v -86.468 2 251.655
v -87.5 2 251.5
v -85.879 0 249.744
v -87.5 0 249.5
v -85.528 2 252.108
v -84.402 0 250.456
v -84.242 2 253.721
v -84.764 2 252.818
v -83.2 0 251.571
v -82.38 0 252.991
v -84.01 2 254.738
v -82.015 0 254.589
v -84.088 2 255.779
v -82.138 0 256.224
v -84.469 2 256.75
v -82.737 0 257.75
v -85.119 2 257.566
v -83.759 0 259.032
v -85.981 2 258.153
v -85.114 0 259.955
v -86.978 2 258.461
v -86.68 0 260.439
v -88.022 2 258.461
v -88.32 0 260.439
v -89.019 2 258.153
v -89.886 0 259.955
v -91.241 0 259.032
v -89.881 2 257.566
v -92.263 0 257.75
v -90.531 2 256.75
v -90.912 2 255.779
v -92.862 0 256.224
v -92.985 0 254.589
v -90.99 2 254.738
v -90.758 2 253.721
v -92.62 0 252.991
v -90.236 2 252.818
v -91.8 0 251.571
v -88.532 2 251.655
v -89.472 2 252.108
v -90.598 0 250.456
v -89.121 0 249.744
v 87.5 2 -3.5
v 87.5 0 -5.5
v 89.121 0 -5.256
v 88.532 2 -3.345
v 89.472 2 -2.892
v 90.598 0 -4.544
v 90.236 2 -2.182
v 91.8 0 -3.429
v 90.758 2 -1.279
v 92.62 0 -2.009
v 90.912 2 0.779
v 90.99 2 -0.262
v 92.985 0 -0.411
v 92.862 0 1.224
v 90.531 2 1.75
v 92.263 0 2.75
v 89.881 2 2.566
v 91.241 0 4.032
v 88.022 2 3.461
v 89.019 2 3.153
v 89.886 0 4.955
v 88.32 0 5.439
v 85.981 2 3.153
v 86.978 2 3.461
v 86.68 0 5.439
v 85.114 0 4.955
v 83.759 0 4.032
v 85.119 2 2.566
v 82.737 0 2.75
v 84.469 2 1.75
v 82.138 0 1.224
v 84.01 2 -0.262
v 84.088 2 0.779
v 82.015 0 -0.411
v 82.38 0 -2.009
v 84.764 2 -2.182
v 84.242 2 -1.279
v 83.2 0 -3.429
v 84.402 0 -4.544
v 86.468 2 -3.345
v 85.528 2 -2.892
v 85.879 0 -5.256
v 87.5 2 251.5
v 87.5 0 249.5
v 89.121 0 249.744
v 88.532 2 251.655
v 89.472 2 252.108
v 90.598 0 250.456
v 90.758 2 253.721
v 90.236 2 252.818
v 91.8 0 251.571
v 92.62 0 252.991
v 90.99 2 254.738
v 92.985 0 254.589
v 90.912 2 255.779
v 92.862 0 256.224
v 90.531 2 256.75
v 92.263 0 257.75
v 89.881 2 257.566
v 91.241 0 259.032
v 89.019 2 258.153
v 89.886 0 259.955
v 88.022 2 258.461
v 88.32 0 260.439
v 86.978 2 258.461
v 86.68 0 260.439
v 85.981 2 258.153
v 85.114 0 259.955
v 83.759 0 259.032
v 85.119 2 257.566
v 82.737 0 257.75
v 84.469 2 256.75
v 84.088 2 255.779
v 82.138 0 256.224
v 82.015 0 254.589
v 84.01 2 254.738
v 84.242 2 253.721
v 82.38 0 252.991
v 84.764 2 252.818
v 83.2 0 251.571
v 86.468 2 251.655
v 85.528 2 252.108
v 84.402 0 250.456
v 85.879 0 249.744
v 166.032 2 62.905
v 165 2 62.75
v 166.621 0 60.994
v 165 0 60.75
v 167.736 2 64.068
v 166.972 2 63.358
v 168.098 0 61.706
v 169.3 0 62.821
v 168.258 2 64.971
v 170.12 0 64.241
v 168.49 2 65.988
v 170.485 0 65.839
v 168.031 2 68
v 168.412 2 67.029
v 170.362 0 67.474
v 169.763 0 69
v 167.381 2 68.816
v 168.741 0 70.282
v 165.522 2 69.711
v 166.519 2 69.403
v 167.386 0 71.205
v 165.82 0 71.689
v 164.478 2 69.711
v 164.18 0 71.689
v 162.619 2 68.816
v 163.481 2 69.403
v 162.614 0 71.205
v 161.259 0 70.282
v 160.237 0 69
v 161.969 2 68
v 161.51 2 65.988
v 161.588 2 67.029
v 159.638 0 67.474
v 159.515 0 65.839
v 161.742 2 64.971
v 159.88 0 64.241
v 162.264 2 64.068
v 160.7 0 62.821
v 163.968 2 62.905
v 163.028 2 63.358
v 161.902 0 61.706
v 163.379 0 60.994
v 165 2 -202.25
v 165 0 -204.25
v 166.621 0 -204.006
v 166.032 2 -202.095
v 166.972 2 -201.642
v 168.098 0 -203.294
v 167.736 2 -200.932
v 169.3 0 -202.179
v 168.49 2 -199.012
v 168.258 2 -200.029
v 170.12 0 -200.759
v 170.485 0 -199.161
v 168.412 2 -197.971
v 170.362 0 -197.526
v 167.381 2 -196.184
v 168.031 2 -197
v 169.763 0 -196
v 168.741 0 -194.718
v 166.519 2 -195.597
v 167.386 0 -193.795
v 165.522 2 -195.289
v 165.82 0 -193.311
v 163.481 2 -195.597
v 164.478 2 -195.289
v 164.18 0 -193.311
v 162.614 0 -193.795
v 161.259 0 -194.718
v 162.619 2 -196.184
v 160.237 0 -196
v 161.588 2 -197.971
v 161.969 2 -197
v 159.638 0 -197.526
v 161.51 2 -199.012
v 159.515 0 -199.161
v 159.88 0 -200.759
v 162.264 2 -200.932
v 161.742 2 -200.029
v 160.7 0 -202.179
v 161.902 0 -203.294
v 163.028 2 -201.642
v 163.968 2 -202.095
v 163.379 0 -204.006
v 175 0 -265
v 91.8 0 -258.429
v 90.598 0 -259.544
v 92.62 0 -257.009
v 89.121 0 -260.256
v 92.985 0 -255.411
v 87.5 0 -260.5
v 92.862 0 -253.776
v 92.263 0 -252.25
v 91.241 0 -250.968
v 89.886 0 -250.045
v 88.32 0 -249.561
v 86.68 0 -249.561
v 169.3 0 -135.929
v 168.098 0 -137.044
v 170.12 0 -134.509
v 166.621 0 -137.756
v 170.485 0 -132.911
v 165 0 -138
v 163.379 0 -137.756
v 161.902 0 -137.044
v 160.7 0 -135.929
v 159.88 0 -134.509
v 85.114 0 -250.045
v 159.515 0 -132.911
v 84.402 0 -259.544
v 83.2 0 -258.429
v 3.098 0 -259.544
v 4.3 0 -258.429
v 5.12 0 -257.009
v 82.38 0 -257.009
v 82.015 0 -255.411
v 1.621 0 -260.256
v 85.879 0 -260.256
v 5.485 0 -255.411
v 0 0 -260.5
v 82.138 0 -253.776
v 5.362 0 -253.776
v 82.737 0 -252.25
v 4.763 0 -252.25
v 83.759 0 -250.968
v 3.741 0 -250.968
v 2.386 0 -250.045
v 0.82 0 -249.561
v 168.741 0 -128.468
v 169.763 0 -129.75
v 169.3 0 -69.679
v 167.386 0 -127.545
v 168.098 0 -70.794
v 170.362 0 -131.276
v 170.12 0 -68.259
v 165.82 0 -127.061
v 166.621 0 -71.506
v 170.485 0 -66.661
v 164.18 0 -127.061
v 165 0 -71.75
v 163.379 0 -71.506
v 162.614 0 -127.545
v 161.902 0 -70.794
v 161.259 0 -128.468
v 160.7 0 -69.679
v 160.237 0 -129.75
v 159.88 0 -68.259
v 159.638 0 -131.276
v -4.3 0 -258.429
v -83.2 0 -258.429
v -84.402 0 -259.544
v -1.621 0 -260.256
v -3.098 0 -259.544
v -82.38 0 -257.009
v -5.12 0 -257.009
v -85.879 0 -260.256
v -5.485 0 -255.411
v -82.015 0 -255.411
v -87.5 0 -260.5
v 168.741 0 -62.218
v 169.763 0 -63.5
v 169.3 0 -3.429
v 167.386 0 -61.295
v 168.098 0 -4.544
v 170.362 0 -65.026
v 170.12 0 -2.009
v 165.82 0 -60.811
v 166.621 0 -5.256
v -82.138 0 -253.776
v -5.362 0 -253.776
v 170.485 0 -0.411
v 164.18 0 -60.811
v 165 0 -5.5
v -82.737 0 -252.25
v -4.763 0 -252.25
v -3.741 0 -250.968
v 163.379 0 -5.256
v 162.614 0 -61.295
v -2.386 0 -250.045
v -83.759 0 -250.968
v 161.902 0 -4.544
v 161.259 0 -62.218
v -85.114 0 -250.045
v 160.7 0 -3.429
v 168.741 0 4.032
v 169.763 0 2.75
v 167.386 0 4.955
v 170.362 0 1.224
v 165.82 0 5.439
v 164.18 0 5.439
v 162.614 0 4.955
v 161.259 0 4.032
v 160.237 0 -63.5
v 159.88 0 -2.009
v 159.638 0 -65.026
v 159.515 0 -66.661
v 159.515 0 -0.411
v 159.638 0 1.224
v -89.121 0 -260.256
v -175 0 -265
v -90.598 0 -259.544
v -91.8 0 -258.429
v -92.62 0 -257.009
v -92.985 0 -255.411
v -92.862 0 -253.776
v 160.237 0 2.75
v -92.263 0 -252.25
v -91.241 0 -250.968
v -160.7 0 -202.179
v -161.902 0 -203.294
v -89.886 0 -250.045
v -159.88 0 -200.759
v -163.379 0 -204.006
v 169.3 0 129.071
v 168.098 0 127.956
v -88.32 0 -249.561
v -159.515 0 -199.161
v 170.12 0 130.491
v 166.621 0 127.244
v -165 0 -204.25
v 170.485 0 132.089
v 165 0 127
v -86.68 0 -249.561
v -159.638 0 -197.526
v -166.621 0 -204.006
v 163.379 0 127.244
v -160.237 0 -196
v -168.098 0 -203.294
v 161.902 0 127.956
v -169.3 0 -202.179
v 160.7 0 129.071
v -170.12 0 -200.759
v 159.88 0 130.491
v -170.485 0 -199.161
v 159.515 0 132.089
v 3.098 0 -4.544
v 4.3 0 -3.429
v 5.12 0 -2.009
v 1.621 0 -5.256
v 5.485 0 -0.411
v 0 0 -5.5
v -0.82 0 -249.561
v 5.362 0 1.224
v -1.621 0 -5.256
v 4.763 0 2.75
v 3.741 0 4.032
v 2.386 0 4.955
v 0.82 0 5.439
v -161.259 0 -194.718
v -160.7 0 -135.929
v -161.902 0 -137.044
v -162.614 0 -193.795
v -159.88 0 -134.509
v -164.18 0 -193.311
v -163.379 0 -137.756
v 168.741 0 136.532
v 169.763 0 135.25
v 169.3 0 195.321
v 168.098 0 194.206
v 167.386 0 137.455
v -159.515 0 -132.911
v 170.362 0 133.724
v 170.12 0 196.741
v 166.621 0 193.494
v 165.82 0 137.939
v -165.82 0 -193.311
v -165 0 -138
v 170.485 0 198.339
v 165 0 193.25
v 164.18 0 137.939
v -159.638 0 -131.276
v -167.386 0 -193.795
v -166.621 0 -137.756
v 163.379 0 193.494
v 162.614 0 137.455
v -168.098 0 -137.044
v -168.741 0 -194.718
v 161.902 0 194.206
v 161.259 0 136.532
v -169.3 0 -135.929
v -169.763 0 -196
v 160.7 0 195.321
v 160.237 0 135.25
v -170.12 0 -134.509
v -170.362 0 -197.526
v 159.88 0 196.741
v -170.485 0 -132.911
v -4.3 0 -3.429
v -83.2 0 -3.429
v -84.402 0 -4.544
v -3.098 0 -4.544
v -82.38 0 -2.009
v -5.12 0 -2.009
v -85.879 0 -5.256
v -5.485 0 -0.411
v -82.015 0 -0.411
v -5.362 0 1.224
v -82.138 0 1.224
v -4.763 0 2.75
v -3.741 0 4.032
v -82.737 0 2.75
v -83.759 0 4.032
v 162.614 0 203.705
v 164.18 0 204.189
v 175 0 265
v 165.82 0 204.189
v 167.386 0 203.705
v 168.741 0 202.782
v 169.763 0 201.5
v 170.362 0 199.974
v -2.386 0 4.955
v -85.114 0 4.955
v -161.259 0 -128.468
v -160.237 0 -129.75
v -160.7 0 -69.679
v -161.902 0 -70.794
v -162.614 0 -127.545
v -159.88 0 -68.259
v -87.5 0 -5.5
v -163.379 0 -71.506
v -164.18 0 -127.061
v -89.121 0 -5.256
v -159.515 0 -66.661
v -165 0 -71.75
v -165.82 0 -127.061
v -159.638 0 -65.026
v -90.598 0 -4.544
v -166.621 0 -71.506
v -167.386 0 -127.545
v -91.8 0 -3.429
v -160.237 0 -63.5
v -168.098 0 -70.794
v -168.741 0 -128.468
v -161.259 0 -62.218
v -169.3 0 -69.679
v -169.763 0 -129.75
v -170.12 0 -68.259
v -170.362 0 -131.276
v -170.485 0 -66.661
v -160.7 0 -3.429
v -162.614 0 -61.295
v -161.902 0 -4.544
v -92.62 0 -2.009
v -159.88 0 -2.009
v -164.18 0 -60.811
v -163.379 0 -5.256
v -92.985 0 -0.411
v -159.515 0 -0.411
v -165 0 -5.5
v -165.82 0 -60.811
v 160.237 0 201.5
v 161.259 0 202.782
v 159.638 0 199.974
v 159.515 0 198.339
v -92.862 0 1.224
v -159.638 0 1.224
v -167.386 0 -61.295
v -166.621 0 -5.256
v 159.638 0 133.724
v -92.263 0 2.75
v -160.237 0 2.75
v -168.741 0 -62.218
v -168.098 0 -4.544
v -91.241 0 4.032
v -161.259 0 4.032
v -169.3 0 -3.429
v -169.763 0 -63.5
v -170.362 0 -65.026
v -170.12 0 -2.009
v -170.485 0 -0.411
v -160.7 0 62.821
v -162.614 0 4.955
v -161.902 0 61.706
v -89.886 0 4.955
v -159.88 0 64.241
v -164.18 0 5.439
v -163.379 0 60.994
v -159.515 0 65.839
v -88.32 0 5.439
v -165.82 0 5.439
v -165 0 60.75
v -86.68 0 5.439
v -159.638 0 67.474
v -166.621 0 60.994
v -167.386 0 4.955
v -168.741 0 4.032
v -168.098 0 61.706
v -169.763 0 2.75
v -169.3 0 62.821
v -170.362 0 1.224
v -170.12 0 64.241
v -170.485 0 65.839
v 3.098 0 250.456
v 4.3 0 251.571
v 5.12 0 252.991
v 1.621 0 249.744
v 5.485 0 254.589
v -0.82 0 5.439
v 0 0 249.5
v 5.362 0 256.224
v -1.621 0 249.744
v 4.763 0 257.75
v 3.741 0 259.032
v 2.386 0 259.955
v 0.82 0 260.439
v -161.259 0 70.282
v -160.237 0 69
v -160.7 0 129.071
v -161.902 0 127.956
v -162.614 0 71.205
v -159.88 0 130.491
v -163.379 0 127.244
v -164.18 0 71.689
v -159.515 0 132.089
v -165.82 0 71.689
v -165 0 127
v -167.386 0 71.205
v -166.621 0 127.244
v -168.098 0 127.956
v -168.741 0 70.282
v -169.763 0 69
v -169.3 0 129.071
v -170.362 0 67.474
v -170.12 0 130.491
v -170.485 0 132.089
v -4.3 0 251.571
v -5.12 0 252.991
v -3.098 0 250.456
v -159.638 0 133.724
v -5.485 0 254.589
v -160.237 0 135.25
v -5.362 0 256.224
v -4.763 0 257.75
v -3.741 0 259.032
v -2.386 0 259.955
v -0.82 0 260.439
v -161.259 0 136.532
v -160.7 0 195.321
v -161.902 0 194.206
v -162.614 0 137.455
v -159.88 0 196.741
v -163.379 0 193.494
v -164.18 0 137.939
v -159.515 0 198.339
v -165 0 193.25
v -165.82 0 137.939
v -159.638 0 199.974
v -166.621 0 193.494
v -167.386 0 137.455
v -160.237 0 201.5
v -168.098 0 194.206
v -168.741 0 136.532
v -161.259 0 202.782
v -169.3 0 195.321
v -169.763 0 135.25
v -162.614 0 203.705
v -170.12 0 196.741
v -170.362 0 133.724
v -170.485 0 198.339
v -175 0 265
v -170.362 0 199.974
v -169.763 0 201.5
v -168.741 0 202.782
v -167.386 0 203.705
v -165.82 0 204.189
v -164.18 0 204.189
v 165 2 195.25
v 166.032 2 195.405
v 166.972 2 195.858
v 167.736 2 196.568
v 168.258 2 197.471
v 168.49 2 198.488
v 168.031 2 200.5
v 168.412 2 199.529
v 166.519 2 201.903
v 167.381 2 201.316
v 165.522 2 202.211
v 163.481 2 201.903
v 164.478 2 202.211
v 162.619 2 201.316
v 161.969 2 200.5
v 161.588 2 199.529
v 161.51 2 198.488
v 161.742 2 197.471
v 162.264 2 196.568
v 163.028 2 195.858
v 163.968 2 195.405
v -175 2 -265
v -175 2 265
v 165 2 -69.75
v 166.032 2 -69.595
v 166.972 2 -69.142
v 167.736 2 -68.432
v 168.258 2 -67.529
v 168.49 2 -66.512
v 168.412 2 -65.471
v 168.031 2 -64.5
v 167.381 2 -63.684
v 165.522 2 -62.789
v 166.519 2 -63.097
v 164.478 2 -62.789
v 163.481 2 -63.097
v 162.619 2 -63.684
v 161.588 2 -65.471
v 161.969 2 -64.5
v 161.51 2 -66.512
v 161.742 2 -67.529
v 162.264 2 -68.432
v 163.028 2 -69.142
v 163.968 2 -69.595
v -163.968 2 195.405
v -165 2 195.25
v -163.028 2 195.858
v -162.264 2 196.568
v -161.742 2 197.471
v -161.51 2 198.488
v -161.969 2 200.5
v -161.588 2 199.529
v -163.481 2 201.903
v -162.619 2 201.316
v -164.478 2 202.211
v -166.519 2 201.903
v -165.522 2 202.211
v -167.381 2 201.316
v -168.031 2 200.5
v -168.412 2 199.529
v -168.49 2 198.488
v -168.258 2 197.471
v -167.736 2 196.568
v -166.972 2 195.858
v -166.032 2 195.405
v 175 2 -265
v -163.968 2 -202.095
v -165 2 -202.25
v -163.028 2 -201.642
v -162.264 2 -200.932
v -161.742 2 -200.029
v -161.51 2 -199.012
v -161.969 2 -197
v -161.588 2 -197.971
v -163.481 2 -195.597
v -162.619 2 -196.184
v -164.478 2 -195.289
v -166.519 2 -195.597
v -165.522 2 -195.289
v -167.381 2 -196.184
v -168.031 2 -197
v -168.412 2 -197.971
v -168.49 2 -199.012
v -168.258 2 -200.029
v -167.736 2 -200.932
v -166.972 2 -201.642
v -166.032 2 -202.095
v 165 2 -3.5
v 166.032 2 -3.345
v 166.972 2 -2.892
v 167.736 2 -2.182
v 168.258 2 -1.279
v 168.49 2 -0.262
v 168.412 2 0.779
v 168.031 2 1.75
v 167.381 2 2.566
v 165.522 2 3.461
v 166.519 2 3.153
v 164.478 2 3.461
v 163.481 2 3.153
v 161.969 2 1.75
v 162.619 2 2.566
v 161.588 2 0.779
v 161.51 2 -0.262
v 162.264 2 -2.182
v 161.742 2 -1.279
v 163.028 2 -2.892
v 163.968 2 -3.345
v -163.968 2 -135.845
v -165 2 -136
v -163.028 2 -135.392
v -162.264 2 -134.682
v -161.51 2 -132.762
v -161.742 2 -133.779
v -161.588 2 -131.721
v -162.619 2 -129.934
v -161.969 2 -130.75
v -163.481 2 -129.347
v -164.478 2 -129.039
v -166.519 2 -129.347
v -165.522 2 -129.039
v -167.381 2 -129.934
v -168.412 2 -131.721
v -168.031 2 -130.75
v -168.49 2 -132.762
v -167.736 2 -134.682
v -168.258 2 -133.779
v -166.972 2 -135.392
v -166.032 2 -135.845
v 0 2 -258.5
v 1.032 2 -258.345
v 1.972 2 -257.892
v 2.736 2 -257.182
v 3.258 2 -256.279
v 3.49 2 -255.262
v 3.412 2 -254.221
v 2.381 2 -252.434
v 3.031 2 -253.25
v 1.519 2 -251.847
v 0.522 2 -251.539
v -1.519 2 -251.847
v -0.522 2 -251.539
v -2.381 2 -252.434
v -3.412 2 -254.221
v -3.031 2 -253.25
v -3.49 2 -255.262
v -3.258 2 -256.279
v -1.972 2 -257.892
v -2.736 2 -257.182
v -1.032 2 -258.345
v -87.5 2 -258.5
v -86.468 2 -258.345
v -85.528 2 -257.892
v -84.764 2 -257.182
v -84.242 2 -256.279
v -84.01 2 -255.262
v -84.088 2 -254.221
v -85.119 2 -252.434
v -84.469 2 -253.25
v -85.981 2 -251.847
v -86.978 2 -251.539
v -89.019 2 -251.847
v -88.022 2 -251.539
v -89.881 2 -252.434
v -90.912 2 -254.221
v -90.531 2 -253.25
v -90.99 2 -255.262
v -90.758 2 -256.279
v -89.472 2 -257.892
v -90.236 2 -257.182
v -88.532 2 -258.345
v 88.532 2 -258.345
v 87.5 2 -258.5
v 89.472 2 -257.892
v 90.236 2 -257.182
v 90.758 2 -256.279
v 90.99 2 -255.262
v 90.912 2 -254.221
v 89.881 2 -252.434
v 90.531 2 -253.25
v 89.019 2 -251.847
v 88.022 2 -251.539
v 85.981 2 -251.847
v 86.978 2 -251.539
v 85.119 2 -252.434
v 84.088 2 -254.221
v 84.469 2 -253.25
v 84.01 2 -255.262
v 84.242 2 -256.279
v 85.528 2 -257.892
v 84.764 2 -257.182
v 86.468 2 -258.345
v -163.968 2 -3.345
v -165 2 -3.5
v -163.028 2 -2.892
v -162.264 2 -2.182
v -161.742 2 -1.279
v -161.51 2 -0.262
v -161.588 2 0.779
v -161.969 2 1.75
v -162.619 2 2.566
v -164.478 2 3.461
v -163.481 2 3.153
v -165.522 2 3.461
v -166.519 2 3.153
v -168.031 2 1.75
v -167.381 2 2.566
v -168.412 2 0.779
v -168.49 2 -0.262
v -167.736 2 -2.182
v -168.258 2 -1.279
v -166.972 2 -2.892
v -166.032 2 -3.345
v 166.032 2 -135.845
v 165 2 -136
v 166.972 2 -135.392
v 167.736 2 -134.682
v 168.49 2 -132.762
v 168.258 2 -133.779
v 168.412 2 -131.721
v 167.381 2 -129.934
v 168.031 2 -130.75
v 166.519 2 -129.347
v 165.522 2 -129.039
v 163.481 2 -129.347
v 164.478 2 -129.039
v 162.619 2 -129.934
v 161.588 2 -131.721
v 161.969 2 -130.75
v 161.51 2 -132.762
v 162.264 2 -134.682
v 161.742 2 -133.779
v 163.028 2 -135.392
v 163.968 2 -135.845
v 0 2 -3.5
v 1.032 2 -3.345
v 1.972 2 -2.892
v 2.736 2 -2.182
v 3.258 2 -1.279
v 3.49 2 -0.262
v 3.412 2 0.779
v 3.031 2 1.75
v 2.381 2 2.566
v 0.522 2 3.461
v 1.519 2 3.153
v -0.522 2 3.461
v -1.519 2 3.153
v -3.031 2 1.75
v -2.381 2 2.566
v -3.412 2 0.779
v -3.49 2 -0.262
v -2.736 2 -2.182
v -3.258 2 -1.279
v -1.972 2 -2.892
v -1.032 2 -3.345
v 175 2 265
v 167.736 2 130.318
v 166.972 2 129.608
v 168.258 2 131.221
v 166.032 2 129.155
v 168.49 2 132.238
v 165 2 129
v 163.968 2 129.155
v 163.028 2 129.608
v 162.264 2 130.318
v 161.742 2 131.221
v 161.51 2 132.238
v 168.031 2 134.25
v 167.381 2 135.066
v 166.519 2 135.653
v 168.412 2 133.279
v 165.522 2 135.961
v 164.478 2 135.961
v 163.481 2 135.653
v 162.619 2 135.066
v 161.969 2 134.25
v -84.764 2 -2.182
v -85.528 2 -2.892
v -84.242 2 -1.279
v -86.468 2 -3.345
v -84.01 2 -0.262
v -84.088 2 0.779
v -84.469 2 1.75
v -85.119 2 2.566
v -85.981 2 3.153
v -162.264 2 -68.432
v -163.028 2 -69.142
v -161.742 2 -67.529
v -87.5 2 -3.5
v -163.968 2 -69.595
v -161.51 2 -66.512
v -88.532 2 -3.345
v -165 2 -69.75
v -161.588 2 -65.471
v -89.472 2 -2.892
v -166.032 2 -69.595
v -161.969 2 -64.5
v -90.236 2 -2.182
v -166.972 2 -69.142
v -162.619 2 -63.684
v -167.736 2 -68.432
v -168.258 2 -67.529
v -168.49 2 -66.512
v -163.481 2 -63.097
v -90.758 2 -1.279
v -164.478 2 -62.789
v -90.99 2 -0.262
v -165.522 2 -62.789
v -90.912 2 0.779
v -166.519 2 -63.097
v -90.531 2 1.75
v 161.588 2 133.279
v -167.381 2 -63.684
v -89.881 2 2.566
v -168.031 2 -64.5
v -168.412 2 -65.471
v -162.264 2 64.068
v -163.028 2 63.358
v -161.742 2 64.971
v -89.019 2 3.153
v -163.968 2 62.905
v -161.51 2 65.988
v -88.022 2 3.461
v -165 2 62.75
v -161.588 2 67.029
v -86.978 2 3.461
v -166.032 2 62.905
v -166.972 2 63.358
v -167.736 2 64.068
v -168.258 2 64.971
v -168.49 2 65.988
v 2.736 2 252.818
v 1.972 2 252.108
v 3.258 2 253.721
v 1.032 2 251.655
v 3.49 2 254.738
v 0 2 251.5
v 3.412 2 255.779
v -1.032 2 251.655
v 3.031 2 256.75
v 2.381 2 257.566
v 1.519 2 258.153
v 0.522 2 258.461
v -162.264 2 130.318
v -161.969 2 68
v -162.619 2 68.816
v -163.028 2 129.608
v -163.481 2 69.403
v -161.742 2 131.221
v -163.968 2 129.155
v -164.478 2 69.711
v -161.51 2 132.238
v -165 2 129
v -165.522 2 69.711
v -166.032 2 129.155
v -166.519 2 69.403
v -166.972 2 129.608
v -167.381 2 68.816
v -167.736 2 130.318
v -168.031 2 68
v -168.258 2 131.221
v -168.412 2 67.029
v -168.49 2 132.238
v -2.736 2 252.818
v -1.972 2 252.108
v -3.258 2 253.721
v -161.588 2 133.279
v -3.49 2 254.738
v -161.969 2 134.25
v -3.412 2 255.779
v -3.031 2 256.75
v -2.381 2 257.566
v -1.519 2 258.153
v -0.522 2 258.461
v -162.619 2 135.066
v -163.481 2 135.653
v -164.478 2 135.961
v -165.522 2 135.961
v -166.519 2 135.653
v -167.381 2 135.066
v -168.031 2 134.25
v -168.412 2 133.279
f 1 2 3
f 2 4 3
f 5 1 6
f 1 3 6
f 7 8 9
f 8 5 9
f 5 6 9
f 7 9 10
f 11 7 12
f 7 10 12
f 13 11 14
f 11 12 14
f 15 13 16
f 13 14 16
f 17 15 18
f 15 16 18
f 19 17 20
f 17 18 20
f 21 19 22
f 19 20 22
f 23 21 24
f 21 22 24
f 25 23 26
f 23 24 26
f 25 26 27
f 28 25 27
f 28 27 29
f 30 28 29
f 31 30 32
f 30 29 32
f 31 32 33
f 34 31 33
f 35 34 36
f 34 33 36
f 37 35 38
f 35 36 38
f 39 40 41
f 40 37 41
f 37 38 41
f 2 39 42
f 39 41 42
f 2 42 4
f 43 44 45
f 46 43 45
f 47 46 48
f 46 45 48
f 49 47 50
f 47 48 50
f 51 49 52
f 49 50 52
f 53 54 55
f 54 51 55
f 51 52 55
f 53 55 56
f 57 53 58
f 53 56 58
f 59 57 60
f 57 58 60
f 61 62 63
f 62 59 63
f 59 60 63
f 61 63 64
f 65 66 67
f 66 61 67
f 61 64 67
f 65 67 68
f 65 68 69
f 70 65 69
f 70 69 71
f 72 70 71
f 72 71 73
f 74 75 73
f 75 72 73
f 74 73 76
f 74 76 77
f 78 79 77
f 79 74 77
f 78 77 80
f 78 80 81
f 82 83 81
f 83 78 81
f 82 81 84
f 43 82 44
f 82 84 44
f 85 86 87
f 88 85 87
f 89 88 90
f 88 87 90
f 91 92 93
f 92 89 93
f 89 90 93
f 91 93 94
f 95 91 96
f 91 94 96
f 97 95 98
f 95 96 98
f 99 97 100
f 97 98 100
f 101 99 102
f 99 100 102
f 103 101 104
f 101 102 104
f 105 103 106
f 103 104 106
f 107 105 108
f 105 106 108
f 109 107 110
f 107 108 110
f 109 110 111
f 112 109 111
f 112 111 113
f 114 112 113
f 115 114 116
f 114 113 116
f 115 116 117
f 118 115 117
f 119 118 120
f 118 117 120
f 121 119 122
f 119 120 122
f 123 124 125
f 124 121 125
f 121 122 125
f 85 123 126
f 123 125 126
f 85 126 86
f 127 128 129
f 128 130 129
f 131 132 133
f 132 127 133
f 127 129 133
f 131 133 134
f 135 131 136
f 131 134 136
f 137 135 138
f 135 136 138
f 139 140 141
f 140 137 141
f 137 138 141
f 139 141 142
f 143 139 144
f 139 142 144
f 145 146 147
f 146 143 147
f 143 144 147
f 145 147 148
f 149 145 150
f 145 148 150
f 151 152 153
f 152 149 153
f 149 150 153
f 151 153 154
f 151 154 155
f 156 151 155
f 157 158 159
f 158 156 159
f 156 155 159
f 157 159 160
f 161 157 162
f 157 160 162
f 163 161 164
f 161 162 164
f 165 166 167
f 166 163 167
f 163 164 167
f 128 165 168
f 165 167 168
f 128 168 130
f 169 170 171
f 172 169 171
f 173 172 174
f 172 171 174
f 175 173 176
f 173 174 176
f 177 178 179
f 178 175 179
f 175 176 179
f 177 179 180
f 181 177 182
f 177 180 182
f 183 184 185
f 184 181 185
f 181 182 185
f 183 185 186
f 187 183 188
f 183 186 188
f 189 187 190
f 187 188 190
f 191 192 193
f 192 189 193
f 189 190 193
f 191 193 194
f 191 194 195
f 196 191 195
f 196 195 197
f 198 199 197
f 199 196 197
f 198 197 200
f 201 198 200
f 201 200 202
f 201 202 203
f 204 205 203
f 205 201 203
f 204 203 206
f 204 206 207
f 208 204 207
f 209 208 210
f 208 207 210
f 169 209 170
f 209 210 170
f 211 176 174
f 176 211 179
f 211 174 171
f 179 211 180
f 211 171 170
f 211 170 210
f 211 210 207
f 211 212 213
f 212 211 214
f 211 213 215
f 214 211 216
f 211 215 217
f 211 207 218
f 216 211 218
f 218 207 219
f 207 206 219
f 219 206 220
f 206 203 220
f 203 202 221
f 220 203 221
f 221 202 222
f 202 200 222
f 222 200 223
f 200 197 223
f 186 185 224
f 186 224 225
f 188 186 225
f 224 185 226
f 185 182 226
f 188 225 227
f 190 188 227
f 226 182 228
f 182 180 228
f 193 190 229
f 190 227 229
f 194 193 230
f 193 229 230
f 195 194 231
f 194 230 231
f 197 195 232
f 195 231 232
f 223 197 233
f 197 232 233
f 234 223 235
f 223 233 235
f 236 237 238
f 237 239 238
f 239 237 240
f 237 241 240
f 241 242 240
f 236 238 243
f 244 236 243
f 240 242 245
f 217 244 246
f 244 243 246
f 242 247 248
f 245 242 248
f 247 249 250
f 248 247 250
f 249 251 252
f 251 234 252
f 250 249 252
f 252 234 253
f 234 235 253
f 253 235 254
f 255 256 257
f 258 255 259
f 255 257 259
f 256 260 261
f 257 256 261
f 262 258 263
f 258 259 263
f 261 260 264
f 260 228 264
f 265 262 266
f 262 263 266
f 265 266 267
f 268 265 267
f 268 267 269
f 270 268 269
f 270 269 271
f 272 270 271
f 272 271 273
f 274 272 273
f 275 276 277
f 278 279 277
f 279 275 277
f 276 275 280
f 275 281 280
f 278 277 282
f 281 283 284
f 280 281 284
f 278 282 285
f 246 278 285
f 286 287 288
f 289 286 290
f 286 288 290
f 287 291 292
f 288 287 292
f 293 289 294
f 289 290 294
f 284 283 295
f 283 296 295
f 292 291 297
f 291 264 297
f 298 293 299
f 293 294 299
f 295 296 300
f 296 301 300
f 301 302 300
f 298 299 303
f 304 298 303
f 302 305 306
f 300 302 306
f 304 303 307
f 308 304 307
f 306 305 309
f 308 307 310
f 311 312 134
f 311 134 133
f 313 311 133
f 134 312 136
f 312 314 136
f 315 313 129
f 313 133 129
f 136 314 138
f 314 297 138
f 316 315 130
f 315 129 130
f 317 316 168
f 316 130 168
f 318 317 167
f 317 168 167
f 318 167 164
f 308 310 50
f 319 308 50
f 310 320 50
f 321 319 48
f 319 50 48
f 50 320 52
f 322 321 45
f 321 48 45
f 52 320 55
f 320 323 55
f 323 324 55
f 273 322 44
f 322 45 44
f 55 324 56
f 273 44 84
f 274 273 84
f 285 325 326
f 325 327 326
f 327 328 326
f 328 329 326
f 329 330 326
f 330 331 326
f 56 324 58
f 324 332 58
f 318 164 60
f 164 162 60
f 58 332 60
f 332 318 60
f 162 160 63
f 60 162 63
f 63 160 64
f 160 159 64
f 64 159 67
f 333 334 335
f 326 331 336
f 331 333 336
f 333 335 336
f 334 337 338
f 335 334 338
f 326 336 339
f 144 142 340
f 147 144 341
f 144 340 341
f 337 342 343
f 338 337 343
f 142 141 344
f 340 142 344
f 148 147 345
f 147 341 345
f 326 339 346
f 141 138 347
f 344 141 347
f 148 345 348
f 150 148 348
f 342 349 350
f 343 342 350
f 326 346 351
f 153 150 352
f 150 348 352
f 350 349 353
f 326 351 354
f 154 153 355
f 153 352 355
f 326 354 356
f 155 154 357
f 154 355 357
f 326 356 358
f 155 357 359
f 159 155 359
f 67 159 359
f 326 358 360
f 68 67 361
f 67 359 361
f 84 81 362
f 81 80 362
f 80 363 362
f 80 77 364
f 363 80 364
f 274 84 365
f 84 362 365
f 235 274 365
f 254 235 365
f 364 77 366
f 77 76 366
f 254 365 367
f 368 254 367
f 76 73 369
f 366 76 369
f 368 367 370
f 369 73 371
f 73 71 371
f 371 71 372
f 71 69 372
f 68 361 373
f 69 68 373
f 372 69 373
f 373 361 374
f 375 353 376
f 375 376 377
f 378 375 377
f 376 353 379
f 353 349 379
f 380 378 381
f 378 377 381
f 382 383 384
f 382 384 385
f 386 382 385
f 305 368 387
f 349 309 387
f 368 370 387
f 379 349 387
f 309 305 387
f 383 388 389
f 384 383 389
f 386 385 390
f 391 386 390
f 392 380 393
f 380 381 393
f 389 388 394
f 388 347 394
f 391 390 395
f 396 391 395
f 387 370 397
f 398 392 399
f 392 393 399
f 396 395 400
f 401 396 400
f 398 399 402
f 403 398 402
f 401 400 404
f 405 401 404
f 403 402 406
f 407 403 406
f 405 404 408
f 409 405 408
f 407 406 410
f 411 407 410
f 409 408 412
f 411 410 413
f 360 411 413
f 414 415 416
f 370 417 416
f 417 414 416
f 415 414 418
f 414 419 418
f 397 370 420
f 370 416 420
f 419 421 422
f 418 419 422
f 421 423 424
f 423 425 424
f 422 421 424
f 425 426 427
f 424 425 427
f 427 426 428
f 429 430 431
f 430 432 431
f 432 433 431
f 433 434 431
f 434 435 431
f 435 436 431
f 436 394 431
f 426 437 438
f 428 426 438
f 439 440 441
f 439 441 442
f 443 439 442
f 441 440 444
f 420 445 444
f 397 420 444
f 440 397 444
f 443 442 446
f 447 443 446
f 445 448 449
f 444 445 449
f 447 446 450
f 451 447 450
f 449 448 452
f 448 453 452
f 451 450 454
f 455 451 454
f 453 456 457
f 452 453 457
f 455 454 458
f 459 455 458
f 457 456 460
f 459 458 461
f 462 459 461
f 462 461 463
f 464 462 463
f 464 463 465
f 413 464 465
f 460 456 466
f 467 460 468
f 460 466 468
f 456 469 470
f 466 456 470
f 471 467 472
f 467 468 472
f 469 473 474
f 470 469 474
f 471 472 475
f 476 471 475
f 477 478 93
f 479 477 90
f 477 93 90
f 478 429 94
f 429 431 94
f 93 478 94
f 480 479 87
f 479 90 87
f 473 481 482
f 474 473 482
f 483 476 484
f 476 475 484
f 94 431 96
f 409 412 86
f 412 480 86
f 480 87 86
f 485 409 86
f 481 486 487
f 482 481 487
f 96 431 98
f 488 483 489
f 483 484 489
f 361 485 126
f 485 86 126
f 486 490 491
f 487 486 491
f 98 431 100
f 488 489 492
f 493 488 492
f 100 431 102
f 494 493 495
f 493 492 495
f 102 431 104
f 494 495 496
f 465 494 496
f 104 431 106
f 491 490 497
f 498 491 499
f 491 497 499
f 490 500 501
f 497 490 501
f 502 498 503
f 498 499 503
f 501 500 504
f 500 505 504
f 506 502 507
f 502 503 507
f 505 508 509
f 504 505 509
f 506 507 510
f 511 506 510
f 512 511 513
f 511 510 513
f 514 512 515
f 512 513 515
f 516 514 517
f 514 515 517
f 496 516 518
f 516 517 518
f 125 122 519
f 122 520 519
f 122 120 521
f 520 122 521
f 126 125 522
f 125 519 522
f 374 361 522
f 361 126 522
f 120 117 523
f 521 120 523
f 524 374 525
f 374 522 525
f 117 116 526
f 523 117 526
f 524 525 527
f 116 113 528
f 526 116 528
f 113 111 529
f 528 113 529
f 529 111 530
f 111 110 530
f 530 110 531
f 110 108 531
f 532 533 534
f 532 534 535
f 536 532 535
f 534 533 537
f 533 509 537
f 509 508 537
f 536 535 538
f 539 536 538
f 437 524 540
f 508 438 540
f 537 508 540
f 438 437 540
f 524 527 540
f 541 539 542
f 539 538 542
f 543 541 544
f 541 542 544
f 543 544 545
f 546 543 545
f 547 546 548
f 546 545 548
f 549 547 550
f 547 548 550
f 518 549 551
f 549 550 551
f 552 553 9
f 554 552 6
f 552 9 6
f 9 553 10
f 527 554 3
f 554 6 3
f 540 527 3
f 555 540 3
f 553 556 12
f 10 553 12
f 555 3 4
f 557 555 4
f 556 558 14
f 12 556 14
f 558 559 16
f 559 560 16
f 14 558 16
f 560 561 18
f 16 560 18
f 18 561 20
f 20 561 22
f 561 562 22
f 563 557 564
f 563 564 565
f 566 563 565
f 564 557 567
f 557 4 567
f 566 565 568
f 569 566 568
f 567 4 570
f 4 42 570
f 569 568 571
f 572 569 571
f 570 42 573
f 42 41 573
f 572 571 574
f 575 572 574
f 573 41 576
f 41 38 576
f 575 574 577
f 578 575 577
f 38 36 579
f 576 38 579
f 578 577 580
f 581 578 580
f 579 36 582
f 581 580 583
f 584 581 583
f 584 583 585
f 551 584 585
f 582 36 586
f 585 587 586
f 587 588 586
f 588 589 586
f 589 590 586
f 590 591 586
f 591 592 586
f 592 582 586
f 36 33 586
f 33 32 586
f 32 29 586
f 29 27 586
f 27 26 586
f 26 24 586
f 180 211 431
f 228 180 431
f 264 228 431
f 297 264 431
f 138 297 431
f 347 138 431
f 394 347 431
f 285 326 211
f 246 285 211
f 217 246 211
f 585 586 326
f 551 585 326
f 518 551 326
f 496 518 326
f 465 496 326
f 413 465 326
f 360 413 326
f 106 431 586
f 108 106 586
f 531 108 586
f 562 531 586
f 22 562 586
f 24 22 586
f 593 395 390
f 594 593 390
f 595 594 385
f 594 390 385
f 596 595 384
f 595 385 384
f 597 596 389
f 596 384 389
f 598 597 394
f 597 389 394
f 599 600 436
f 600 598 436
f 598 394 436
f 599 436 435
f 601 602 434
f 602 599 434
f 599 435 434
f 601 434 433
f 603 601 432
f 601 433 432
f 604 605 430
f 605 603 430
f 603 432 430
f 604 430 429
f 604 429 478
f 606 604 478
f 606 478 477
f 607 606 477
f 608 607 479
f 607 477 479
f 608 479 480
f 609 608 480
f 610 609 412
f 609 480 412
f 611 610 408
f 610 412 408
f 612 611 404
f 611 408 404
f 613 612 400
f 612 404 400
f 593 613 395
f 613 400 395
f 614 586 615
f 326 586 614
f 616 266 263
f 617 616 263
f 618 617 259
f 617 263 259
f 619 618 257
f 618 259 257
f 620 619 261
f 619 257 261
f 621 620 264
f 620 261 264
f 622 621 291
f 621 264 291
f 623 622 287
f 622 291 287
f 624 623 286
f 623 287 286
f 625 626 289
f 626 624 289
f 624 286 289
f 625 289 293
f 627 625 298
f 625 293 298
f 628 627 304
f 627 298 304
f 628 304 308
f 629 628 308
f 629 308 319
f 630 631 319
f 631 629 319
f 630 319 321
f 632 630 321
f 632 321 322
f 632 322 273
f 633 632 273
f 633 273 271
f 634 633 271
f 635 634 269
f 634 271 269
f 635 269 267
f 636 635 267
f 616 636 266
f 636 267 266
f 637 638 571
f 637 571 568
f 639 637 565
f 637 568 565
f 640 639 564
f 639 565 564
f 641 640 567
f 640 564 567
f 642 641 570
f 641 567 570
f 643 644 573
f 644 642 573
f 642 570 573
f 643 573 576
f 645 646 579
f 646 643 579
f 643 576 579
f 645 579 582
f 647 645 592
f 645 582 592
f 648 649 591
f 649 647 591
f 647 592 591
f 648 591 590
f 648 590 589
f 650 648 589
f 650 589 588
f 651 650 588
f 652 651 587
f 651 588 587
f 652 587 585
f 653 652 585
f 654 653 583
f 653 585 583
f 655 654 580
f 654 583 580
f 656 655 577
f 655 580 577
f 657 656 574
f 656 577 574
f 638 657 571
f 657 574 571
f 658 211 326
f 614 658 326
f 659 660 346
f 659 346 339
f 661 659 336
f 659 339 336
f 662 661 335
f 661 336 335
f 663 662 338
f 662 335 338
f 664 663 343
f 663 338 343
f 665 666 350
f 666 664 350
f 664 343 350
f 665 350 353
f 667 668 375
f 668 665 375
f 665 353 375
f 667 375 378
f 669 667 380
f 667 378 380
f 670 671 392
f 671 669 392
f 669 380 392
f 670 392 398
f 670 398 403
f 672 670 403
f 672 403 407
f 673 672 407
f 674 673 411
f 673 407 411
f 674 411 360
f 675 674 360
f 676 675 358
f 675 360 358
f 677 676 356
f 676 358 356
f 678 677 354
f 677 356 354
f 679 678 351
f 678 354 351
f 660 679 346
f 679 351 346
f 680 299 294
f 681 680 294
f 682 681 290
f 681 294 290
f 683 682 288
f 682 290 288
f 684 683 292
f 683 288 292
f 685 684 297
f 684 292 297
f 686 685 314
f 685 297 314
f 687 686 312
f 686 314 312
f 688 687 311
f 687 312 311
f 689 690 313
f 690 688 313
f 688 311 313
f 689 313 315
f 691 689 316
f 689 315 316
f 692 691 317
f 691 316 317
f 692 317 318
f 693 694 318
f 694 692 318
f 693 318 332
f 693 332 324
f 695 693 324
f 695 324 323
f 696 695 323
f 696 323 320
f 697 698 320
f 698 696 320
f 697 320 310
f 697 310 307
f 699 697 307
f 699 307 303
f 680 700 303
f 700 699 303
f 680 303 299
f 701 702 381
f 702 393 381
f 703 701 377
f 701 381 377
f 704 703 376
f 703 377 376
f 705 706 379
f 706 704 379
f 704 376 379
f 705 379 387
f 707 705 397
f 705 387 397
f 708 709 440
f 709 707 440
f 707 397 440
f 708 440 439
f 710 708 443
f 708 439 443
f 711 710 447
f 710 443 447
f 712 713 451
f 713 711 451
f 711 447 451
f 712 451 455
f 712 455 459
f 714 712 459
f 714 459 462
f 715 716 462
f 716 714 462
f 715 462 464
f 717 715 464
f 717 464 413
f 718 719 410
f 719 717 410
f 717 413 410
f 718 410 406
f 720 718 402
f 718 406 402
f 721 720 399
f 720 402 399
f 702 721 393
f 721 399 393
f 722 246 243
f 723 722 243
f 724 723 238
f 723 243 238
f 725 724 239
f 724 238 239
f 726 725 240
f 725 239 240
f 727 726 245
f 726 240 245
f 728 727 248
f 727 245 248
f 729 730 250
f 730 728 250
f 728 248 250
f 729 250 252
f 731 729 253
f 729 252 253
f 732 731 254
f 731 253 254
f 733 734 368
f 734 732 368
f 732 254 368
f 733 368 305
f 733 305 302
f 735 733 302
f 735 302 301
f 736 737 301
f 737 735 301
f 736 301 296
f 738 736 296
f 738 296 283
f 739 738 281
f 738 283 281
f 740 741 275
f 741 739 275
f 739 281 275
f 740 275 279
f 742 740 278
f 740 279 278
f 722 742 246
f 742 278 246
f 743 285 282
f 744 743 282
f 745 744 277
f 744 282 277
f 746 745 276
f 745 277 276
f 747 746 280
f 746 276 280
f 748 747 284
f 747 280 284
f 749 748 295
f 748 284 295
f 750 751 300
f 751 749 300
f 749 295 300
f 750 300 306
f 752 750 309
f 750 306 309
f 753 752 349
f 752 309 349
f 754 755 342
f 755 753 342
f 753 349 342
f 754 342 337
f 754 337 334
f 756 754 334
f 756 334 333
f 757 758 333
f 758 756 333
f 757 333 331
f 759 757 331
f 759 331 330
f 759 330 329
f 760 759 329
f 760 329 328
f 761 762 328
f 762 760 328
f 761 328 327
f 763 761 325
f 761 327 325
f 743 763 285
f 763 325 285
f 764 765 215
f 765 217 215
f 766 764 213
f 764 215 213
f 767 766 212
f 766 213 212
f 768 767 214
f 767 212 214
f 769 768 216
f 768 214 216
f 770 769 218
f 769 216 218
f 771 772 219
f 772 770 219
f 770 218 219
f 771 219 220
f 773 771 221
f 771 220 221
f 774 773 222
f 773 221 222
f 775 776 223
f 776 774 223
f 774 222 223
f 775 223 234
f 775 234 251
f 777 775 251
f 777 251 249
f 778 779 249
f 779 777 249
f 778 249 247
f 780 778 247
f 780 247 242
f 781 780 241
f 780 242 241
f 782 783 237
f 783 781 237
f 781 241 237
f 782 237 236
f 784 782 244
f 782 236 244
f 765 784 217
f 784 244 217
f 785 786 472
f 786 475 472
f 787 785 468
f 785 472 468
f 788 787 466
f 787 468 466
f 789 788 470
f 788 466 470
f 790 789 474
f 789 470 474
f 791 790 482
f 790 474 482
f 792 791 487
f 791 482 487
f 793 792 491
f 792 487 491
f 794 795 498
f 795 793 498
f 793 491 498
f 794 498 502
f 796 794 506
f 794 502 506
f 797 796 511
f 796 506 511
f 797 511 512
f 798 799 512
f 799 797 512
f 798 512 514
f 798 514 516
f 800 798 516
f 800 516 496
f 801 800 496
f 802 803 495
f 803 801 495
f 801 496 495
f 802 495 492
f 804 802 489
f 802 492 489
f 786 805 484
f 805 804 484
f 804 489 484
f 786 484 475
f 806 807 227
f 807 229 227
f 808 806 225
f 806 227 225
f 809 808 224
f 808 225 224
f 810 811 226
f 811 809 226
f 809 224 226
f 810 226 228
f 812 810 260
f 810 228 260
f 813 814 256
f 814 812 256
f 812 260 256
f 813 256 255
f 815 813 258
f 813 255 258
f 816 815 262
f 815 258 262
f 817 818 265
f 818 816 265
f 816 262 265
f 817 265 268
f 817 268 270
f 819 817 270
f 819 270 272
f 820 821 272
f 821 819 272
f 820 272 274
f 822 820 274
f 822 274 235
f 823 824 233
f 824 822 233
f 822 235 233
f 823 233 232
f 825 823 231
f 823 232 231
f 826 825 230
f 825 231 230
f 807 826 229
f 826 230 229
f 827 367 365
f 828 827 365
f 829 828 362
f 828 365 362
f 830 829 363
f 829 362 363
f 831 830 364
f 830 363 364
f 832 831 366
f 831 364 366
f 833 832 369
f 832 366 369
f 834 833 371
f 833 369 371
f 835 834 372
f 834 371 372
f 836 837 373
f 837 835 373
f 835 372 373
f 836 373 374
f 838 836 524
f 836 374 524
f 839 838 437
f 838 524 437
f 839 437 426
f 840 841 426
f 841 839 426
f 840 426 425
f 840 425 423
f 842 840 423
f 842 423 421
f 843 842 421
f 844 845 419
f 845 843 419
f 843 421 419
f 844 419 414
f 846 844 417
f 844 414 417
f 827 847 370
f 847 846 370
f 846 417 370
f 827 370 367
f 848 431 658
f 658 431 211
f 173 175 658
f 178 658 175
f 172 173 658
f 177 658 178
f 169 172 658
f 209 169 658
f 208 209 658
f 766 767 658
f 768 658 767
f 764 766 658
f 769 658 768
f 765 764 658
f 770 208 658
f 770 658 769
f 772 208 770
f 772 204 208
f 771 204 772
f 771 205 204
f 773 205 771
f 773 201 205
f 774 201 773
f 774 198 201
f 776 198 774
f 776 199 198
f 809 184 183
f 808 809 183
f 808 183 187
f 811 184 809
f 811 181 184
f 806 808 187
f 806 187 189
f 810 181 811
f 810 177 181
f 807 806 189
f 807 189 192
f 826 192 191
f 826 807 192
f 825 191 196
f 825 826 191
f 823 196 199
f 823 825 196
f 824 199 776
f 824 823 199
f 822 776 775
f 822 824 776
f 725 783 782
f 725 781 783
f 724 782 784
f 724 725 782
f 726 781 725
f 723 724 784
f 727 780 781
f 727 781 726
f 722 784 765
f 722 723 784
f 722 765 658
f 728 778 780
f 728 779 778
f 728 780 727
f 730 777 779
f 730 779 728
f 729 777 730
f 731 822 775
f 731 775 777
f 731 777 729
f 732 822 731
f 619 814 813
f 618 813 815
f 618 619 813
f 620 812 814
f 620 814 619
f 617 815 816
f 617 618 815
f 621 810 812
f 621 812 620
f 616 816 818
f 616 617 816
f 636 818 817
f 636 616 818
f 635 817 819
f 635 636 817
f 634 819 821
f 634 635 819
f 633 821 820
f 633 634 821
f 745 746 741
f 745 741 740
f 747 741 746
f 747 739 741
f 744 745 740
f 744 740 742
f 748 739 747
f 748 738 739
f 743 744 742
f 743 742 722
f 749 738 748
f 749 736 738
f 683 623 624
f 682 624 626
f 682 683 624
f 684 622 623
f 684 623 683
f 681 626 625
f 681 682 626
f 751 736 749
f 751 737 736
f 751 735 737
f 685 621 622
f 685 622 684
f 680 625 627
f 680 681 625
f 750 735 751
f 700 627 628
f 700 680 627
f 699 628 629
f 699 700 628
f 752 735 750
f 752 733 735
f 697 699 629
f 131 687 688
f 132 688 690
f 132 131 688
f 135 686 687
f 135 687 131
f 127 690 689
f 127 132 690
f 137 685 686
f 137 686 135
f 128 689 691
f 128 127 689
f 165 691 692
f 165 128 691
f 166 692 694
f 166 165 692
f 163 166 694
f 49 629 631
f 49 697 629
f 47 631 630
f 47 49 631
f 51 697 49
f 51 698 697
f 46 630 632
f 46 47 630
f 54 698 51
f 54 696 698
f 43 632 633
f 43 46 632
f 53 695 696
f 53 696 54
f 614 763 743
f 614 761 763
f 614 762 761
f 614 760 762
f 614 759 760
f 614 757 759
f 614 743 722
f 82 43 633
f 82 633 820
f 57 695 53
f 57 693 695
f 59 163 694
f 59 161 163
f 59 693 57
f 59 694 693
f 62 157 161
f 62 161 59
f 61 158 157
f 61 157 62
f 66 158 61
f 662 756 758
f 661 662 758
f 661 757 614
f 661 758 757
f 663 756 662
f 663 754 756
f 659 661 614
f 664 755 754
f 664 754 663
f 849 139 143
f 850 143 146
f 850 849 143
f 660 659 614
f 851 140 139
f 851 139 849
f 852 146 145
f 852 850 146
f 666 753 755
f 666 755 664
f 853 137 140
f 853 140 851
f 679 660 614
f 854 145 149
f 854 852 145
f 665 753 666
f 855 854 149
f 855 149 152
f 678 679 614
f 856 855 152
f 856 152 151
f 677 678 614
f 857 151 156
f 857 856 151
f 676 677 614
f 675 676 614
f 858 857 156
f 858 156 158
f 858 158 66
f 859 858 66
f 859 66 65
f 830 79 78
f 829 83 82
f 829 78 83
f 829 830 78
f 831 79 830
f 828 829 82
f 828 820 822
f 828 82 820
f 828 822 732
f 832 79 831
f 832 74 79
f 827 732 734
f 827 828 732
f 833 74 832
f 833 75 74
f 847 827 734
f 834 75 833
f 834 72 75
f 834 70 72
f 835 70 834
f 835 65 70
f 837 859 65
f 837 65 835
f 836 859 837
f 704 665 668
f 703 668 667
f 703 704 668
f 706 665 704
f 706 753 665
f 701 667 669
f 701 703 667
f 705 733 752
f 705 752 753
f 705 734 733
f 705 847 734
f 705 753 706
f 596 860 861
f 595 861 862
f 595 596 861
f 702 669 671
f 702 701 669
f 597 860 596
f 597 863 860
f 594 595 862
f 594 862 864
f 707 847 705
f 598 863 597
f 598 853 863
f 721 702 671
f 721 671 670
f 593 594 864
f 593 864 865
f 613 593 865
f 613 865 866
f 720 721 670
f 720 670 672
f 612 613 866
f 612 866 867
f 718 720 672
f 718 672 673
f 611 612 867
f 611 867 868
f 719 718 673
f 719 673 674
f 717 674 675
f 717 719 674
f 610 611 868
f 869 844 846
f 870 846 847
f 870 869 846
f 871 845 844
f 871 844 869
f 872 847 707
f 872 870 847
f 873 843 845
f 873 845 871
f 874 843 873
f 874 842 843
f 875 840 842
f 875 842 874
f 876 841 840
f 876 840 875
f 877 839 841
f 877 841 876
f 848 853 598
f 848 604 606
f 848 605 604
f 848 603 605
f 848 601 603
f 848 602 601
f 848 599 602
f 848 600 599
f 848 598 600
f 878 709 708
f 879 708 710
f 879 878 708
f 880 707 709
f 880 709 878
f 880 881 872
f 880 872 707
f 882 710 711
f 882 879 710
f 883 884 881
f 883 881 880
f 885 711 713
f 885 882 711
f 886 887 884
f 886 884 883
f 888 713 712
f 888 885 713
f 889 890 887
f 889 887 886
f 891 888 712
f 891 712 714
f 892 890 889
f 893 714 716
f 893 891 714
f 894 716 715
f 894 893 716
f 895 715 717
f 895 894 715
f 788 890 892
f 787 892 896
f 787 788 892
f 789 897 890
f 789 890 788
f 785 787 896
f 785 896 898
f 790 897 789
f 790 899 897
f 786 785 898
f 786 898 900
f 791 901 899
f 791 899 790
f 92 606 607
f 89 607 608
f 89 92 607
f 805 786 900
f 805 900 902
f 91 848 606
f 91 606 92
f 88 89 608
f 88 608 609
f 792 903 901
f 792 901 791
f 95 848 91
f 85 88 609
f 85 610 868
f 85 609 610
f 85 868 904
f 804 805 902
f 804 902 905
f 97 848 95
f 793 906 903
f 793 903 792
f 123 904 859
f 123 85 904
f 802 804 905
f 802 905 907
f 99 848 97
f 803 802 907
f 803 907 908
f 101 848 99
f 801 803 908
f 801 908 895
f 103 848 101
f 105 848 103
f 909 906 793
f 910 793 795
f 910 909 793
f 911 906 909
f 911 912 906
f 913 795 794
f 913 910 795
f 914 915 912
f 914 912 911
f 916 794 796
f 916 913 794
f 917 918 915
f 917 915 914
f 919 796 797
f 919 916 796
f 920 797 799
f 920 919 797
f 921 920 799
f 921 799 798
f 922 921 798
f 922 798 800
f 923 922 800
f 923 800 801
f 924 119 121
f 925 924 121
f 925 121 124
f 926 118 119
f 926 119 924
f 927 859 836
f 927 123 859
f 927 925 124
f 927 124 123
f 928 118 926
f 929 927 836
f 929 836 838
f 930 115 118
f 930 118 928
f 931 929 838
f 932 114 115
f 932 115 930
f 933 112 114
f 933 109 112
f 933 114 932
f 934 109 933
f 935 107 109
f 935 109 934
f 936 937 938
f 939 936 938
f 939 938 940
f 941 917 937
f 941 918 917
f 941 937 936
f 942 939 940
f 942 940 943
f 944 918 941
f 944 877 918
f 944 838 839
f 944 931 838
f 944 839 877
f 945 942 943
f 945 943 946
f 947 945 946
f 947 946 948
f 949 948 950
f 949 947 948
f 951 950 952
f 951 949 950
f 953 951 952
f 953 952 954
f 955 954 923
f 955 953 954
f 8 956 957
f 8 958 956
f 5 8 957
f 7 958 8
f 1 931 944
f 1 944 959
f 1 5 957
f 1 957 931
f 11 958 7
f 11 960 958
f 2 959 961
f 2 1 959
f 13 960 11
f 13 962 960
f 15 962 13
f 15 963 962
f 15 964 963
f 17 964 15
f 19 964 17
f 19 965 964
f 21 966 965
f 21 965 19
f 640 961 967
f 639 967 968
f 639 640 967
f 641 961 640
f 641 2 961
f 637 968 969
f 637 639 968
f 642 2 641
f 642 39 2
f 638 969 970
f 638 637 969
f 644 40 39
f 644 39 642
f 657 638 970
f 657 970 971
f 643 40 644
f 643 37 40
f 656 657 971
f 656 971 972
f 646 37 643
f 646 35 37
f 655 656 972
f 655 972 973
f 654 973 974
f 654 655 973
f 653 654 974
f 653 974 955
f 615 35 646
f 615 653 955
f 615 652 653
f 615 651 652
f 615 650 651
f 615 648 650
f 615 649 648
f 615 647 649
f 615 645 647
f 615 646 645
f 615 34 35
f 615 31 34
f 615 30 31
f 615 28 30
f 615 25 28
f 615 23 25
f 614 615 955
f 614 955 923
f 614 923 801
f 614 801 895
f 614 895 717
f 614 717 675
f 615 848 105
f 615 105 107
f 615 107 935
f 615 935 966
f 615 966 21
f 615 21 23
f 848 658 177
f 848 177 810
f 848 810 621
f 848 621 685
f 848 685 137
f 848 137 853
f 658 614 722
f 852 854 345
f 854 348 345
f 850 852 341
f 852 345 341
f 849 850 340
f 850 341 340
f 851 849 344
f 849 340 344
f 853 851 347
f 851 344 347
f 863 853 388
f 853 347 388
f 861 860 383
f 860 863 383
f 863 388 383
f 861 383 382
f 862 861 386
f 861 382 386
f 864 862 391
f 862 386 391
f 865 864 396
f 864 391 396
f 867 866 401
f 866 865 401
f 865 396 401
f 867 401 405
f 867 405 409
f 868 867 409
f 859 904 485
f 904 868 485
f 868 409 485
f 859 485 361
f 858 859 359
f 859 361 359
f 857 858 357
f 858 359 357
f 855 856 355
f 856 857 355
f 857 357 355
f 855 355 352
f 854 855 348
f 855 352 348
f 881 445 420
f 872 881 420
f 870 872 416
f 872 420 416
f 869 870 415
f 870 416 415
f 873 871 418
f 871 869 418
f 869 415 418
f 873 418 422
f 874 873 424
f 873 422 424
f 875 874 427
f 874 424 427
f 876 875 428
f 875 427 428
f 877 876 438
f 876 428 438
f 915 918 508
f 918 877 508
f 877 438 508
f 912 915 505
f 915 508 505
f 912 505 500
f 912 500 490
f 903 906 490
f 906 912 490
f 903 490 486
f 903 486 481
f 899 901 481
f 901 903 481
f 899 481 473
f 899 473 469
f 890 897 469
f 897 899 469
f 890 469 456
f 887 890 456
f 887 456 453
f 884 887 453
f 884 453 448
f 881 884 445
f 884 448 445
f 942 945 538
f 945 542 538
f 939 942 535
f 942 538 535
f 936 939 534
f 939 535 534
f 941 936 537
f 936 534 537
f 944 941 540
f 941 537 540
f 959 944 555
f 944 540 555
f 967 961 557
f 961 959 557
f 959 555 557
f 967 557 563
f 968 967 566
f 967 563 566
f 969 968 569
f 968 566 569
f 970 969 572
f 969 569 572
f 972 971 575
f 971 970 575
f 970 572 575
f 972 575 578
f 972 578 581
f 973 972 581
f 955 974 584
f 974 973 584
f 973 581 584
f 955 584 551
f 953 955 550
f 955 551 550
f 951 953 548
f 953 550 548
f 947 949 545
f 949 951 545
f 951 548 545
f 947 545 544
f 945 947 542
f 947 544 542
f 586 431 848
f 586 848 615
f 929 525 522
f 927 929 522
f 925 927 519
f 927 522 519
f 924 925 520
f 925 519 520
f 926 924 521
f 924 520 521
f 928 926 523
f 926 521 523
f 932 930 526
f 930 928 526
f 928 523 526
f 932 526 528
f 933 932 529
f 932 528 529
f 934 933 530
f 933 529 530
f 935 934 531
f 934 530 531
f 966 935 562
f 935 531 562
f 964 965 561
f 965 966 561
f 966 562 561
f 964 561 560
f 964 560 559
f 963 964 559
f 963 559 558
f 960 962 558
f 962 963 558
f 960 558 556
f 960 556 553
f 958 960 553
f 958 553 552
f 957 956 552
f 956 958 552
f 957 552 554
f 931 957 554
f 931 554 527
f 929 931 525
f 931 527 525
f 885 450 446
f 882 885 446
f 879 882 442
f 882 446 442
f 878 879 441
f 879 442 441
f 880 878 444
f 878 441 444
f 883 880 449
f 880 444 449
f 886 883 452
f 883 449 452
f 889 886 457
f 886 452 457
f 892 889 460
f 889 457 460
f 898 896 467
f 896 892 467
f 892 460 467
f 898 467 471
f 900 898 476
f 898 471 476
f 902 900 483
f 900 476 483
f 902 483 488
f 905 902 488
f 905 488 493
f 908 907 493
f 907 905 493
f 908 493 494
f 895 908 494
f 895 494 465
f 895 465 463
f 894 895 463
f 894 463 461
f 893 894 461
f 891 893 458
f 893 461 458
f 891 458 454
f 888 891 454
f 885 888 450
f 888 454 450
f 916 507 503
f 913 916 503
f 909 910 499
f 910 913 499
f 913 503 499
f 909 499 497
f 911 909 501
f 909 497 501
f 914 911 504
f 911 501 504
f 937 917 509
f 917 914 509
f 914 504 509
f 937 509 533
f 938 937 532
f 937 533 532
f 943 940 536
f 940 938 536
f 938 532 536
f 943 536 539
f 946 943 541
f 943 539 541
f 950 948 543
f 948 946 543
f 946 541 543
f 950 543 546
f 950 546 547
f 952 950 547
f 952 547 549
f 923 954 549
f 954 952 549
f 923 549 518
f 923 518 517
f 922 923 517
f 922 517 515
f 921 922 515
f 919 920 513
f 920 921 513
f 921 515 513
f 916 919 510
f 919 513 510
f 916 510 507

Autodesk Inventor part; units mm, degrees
ref_plane "YZ Plane" through (0, 0, 0) normal (1, 0, 0) x (0, 1, 0)
ref_plane "XZ Plane" through (0, 0, 0) normal (0, 1, 0) x (-1, 0, 0)
ref_plane "XY Plane" through (0, 0, 0) normal (0, 0, 1) x (1, 0, 0)
sketch "Эскиз1" plane through (0, 0, 0) normal (0, 1, 0) x (-1, 0, 0)
  line L0 (0, 265) -> (175, 265)
  line L1 (175, 265) -> (175, -265)
  line L2 (0, 265) -> (0, 0)
  line L3 (0, 0) -> (200, 0)
  line L4 (0, 265) -> (-175, 265)
  line L5 (-175, 265) -> (-175, -265)
  line L6 (0, -265) -> (175, -265)
  line L7 (175, -265) -> (175, -125)
  line L8 (-175, -265) -> (-175, -125)
  line L9 (0, -265) -> (-175, -265)
  point P0 (175, 125)
  point P1 (-175, 125)
  dimension "d3" = 350
  dimension "d6" = 530
extrude "Выдавливание1" add sketch "Эскиз1" along normal blind 2
sketch "Эскиз2" plane through (0, 0, 0) normal (0, 1, 0) x (1, 0, 0)
  line L0 (-175, -265) -> (175, -265) projected
  line L1 (175, -265) -> (175, 265) projected
  point P0 (0, 0)
  point P1 (87.5, -255)
  point P2 (0, -255)
  point P3 (-87.5, -255)
  point P4 (87.5, 0)
  point P5 (0, 0)
  point P6 (-87.5, 0)
  point P7 (87.5, 255)
  point P8 (0, 255)
  point P9 (-87.5, 255)
  point P10 (165, -198.75)
  point P11 (165, -132.5)
  point P12 (165, -66.25)
  point P13 (165, 0)
  point P14 (165, 66.25)
  point P15 (165, 132.5)
  point P16 (165, 198.75)
  point P17 (-165, -198.75)
  point P18 (-165, -132.5)
  point P19 (-165, -66.25)
  point P20 (-165, 0)
  point P21 (-165, 66.25)
  point P22 (-165, 132.5)
  point P23 (-165, 198.75)
  dimension "d15" = 10
  dimension "d16" = 87.5
  dimension "d19" = 87.5
  dimension "d22" = 255
  dimension "d25" = 10
  dimension "d26" = 66.25
  dimension "d29" = 66.25
  dimension "d32" = 330
hole "Отверстие2" at (87.5, 0, 255) at (0, 0, 255) at (-87.5, 0, 255) at (87.5, 0, 0) at (0, 0, 0) at (-87.5, 0, 0) at (87.5, 0, -255) at (0, 0, -255) at (-87.5, 0, -255) at (165, 0, 198.75) at (165, 0, 132.5) at (165, 0, 66.25) at (165, 0, 0) at (165, 0, -66.25) at (165, 0, -132.5) at (165, 0, -198.75) at (-165, 0, 198.75) at (-165, 0, 132.5) at (-165, 0, 66.25) at (-165, 0, 0) at (-165, 0, -66.25) at (-165, 0, -132.5) at (-165, 0, -198.75) direction (0, 1, 0) diameter 3 end through all countersink diameter 11 countersink angle 90
sketch "Эскиз3" plane through (0, 0, 0) normal (0, -1, 0) x (1, 0, 0)
  line L0 (-245, 0) -> (245, 0) projected
  line L1 (0, -371) -> (0, 371) projected
  line L2 (-175, 265) -> (175, 265) projected
  point P0 (0, 0)
  point P1 (120, 207)
  point P2 (64, 207)
  point P3 (120, 235)
  point P4 (64, 235)
  point P5 (-120, 207)
  point P6 (-64, 207)
  point P7 (-120, 235)
  point P8 (-64, 235)
  point P9 (120, -207)
  point P10 (64, -207)
  point P11 (120, -235)
  point P12 (64, -235)
  point P13 (-120, -235)
  point P14 (-120, -207)
  point P15 (-64, -207)
  point P16 (-64, -235)
  dimension "d52" = 56
  dimension "d55" = 28
  dimension "d59" = 120
  dimension "d60" = 30
properties part number "нижняя плита" material "СВМПЭ, белый"
